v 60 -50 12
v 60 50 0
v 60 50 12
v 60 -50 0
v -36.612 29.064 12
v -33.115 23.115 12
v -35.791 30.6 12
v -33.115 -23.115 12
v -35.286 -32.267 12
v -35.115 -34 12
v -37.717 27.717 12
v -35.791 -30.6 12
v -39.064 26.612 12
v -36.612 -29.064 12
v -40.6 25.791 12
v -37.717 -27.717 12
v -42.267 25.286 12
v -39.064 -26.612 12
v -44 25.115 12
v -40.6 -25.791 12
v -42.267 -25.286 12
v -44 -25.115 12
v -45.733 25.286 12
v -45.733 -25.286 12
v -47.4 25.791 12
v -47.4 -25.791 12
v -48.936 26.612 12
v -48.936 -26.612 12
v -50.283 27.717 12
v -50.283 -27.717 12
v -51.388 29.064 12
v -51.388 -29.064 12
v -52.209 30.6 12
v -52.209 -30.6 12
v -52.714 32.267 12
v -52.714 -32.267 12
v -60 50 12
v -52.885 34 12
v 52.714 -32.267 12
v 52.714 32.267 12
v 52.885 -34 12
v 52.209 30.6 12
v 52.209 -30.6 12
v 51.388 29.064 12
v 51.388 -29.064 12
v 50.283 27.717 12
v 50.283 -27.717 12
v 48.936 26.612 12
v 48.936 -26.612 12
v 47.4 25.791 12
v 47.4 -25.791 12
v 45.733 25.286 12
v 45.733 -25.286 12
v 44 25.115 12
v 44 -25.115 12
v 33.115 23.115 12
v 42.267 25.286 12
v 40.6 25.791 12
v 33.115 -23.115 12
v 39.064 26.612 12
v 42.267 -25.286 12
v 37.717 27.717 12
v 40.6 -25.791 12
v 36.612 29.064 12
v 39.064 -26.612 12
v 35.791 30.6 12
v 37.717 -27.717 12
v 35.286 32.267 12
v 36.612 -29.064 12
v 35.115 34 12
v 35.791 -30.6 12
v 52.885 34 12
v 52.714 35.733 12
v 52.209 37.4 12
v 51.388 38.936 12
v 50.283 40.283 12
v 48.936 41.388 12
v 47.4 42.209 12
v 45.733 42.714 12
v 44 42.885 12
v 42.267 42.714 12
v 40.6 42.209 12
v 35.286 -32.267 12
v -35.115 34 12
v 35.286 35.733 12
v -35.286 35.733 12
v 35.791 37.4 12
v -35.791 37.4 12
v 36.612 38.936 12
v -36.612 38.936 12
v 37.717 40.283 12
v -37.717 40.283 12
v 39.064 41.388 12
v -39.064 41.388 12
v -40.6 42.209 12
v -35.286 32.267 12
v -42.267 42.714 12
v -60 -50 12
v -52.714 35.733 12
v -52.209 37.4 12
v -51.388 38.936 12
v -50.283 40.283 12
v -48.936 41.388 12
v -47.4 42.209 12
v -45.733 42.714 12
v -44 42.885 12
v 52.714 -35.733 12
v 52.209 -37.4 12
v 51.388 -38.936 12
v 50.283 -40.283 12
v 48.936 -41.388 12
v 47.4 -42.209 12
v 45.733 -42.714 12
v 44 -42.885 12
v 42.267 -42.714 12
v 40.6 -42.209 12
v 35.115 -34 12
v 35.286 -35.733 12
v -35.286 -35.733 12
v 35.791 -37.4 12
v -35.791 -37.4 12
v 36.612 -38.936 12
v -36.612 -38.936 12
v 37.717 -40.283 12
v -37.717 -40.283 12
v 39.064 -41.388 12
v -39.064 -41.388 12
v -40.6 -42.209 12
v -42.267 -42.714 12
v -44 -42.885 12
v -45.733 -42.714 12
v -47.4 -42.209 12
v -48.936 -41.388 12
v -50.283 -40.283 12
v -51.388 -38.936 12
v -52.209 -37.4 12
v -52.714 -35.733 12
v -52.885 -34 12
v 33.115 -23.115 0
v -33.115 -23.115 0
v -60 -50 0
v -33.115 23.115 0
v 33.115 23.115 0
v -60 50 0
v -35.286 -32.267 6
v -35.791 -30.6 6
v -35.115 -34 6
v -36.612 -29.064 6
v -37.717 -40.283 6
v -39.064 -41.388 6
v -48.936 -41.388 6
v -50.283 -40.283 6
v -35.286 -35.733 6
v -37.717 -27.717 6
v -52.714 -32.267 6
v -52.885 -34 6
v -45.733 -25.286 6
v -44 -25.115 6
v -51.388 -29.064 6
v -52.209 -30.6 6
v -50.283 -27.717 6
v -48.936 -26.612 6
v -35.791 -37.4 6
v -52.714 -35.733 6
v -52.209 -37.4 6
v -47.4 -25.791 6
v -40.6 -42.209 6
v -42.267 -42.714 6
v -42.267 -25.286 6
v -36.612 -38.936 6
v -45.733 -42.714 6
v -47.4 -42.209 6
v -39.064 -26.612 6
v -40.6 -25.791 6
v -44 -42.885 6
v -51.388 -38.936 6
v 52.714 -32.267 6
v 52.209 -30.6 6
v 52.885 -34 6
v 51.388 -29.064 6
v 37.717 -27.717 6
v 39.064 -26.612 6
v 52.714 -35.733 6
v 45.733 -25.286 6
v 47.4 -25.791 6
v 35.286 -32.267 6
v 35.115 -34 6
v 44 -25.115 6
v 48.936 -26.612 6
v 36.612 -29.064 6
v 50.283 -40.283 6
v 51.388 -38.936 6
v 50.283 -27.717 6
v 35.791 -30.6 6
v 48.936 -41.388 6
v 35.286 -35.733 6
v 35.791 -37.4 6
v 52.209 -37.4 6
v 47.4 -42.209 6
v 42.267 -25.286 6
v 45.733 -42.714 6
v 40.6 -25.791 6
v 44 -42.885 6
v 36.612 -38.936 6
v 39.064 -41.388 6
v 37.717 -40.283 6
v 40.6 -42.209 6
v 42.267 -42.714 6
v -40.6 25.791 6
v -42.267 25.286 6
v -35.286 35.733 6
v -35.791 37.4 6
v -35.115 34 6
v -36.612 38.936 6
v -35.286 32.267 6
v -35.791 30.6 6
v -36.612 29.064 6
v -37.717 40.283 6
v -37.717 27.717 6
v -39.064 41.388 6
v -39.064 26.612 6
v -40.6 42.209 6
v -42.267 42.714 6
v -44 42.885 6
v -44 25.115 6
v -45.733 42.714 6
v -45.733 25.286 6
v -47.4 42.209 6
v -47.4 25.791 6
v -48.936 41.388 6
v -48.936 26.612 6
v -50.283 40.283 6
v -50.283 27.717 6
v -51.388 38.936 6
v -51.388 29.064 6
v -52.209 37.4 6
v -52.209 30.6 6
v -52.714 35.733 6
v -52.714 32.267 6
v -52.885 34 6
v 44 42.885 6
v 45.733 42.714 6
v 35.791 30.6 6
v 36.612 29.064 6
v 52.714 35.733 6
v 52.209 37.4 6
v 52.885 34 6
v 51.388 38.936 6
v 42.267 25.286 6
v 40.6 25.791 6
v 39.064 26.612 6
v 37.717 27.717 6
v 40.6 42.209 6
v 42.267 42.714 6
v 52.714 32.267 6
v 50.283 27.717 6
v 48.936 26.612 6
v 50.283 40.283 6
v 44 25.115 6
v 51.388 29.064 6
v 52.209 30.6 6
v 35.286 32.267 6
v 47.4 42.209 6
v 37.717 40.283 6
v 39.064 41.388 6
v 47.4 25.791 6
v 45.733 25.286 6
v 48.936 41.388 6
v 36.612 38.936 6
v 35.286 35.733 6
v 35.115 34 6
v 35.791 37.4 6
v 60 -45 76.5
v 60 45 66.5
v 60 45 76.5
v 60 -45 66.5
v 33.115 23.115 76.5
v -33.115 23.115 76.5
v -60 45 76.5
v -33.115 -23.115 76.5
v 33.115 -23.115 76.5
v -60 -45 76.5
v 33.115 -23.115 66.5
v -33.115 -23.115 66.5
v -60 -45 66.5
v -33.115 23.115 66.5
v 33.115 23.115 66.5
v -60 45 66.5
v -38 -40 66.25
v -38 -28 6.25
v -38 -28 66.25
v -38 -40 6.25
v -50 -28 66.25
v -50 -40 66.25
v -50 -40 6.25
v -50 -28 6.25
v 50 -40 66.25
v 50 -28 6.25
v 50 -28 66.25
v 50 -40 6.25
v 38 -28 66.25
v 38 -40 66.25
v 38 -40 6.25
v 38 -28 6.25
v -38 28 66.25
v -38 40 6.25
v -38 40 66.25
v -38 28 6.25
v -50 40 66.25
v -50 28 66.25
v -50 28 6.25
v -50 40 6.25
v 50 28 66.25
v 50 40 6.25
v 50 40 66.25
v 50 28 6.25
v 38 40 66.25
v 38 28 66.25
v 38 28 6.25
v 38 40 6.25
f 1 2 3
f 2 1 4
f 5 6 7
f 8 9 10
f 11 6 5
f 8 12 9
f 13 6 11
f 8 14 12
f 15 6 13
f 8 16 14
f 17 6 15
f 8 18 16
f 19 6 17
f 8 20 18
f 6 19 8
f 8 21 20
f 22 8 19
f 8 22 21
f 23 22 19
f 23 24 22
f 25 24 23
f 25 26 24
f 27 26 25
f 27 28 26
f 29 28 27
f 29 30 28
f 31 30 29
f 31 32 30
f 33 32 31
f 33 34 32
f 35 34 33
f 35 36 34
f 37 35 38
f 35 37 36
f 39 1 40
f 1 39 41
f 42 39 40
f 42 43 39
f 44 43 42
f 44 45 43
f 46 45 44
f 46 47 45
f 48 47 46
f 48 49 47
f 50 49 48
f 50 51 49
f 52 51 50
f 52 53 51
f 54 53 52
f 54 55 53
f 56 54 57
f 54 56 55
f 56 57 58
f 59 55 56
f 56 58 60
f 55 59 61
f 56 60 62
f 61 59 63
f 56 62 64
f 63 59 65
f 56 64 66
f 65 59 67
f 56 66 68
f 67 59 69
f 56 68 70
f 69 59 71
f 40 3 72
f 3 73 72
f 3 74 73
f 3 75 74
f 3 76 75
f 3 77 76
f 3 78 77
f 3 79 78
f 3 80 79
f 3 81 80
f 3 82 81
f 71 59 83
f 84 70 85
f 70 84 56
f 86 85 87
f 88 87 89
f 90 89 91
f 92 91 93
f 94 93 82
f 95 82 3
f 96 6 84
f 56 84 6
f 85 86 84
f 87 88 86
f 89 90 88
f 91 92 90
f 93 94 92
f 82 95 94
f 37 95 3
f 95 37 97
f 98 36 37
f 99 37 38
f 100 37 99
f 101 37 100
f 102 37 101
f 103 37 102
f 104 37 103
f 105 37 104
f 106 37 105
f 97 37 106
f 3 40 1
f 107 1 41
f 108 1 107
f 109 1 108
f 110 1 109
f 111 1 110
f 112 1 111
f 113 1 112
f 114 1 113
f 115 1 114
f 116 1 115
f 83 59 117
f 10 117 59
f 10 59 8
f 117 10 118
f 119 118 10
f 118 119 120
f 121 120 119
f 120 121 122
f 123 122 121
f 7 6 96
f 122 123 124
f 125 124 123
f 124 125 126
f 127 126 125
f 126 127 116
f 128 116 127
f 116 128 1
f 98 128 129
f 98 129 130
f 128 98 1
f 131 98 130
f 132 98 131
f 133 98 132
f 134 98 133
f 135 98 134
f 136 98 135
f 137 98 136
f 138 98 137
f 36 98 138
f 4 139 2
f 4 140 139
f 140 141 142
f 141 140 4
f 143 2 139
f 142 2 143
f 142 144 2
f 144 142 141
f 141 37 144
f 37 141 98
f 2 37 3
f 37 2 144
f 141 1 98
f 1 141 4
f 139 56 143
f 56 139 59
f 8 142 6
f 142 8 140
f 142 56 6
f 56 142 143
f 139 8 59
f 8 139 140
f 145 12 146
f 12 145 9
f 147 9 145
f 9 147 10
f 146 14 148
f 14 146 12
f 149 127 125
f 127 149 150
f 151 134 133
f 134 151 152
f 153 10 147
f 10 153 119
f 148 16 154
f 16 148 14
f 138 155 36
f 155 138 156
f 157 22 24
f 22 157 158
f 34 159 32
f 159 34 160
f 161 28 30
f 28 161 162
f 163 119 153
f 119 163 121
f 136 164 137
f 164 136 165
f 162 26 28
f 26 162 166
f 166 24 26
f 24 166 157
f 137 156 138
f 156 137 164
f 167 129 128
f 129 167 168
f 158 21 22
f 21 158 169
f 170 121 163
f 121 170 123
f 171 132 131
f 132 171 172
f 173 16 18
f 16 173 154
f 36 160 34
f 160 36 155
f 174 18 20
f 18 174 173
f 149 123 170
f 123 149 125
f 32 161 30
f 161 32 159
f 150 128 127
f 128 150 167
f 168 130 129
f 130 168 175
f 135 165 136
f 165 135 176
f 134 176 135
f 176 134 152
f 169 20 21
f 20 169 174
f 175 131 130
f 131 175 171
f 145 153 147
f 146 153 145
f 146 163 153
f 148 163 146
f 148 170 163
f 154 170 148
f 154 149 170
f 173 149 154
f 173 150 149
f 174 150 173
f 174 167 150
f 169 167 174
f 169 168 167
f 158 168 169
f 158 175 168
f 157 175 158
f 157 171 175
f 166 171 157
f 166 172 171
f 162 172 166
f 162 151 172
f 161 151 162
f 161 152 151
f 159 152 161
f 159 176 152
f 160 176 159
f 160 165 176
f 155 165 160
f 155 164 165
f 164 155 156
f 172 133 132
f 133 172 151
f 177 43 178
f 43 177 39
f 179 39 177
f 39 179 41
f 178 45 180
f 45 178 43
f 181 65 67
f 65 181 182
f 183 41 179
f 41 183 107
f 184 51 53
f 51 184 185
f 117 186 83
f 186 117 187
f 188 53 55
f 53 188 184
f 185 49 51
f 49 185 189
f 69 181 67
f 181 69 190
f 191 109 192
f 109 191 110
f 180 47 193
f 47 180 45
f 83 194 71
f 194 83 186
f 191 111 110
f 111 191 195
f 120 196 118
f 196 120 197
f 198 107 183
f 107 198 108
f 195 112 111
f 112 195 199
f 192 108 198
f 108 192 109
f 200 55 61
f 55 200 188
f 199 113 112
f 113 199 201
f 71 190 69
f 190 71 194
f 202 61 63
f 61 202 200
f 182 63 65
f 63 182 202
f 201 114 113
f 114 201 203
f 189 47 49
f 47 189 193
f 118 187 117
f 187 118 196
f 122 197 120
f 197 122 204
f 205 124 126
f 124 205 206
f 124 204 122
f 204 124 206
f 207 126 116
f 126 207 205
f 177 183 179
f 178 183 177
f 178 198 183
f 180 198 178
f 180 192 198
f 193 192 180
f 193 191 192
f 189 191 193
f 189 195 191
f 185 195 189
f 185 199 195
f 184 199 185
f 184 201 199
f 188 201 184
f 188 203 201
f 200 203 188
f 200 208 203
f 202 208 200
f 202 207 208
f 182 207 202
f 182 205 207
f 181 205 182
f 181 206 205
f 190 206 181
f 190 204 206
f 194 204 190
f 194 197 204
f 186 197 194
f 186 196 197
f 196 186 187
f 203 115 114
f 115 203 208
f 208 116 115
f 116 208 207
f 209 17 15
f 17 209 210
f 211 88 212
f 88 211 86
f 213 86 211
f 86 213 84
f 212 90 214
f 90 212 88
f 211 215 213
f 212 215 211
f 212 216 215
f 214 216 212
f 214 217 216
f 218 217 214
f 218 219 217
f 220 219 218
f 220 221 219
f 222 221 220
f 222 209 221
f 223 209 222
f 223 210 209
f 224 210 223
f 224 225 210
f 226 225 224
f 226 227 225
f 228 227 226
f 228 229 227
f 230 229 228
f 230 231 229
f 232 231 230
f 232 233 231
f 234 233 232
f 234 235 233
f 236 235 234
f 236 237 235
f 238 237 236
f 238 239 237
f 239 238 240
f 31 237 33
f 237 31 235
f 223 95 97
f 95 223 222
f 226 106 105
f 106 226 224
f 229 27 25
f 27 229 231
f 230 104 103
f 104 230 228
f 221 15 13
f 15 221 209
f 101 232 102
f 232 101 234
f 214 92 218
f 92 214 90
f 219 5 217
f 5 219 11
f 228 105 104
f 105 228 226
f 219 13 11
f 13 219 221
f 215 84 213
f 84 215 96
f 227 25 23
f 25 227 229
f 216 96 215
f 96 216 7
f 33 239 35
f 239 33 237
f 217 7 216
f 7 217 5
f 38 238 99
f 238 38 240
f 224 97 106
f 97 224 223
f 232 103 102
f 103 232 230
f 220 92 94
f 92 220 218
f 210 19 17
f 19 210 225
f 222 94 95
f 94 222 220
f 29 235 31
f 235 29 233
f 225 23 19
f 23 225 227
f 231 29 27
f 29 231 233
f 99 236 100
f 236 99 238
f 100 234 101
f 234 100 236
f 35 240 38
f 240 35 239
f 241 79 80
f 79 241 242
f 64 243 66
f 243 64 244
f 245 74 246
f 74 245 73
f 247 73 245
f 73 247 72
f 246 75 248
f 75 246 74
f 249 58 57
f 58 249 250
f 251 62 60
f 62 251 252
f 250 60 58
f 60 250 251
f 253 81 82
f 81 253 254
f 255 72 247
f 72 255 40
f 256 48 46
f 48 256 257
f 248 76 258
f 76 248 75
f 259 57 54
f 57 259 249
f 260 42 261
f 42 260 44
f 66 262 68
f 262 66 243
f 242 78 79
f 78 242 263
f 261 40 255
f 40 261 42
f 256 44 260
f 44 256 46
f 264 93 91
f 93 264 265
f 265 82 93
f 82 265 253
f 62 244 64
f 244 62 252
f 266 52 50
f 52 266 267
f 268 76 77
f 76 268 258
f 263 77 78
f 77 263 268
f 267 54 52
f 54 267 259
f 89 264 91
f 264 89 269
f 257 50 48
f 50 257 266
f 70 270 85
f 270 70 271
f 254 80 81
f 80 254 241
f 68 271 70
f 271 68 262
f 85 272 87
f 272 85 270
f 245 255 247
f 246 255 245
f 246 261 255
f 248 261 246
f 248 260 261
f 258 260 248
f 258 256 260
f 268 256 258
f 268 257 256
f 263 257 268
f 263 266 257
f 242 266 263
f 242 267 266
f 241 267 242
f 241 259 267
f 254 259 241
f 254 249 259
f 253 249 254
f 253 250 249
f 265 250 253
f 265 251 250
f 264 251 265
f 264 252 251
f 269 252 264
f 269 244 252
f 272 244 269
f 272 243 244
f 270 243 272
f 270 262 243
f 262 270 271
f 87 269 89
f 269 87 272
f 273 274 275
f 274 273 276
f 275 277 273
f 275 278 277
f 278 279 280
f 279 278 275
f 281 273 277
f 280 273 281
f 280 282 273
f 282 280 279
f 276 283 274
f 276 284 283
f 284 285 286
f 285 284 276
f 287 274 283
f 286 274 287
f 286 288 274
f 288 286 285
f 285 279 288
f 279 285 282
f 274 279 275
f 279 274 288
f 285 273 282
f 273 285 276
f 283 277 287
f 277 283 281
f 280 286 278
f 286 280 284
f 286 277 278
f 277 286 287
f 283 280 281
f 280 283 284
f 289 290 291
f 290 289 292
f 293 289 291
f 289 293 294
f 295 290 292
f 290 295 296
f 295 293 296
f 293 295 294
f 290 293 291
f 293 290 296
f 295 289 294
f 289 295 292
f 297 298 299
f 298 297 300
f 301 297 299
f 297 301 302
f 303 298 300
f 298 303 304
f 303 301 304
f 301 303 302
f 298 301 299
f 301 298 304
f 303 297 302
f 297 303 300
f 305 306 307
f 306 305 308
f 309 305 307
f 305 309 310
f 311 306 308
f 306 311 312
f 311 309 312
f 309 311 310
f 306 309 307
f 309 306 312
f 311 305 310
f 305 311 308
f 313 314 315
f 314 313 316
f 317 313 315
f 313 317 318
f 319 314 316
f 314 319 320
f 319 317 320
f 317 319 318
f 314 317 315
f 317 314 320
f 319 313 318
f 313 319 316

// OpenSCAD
$fn = 32;

// ------------------------------------------------------------------------
// Frame cube: base 120 x 100 mm, posts 60 mm tall
// Every part is its own module, assembly() places every instance.
// ------------------------------------------------------------------------

// --- part 1 ---
module base_frame() {
  difference() {
    translate([-60, -50, 0]) cube([120, 100, 12]);
    translate([-33.115, -23.115, -1]) cube([66.23, 46.23, 14]);
    translate([-44, -34, 6]) cylinder(h = 7, d = 17.77);
    translate([44, -34, 6]) cylinder(h = 7, d = 17.77);
    translate([-44, 34, 6]) cylinder(h = 7, d = 17.77);
    translate([44, 34, 6]) cylinder(h = 7, d = 17.77);
  }
}

// --- part 2 ---
module corner_post() {
  translate([-6, -6, 0]) cube([12, 12, 60]);
}

// --- part 3 ---
module top_frame() {
  difference() {
    translate([-60, -45, 0]) cube([120, 90, 10]);
    translate([-33.115, -23.115, -1]) cube([66.23, 46.23, 12]);
  }
}

// --- assembly ---
module assembly() {
  color([0.80, 0.24, 0.20]) translate([0, 0, 0]) rotate([0, 0, 0]) base_frame();
  color([0.20, 0.45, 0.75]) translate([-44, -34, 6.25]) rotate([0, 0, 0]) corner_post();
  color([0.25, 0.62, 0.32]) translate([44, -34, 6.25]) rotate([0, 0, 0]) corner_post();
  color([0.92, 0.70, 0.18]) translate([-44, 34, 6.25]) rotate([0, 0, 0]) corner_post();
  color([0.58, 0.35, 0.70]) translate([44, 34, 6.25]) rotate([0, 0, 0]) corner_post();
  color([0.16, 0.66, 0.66]) translate([0, 0, 66.5]) rotate([0, 0, 0]) top_frame();
}

assembly();
